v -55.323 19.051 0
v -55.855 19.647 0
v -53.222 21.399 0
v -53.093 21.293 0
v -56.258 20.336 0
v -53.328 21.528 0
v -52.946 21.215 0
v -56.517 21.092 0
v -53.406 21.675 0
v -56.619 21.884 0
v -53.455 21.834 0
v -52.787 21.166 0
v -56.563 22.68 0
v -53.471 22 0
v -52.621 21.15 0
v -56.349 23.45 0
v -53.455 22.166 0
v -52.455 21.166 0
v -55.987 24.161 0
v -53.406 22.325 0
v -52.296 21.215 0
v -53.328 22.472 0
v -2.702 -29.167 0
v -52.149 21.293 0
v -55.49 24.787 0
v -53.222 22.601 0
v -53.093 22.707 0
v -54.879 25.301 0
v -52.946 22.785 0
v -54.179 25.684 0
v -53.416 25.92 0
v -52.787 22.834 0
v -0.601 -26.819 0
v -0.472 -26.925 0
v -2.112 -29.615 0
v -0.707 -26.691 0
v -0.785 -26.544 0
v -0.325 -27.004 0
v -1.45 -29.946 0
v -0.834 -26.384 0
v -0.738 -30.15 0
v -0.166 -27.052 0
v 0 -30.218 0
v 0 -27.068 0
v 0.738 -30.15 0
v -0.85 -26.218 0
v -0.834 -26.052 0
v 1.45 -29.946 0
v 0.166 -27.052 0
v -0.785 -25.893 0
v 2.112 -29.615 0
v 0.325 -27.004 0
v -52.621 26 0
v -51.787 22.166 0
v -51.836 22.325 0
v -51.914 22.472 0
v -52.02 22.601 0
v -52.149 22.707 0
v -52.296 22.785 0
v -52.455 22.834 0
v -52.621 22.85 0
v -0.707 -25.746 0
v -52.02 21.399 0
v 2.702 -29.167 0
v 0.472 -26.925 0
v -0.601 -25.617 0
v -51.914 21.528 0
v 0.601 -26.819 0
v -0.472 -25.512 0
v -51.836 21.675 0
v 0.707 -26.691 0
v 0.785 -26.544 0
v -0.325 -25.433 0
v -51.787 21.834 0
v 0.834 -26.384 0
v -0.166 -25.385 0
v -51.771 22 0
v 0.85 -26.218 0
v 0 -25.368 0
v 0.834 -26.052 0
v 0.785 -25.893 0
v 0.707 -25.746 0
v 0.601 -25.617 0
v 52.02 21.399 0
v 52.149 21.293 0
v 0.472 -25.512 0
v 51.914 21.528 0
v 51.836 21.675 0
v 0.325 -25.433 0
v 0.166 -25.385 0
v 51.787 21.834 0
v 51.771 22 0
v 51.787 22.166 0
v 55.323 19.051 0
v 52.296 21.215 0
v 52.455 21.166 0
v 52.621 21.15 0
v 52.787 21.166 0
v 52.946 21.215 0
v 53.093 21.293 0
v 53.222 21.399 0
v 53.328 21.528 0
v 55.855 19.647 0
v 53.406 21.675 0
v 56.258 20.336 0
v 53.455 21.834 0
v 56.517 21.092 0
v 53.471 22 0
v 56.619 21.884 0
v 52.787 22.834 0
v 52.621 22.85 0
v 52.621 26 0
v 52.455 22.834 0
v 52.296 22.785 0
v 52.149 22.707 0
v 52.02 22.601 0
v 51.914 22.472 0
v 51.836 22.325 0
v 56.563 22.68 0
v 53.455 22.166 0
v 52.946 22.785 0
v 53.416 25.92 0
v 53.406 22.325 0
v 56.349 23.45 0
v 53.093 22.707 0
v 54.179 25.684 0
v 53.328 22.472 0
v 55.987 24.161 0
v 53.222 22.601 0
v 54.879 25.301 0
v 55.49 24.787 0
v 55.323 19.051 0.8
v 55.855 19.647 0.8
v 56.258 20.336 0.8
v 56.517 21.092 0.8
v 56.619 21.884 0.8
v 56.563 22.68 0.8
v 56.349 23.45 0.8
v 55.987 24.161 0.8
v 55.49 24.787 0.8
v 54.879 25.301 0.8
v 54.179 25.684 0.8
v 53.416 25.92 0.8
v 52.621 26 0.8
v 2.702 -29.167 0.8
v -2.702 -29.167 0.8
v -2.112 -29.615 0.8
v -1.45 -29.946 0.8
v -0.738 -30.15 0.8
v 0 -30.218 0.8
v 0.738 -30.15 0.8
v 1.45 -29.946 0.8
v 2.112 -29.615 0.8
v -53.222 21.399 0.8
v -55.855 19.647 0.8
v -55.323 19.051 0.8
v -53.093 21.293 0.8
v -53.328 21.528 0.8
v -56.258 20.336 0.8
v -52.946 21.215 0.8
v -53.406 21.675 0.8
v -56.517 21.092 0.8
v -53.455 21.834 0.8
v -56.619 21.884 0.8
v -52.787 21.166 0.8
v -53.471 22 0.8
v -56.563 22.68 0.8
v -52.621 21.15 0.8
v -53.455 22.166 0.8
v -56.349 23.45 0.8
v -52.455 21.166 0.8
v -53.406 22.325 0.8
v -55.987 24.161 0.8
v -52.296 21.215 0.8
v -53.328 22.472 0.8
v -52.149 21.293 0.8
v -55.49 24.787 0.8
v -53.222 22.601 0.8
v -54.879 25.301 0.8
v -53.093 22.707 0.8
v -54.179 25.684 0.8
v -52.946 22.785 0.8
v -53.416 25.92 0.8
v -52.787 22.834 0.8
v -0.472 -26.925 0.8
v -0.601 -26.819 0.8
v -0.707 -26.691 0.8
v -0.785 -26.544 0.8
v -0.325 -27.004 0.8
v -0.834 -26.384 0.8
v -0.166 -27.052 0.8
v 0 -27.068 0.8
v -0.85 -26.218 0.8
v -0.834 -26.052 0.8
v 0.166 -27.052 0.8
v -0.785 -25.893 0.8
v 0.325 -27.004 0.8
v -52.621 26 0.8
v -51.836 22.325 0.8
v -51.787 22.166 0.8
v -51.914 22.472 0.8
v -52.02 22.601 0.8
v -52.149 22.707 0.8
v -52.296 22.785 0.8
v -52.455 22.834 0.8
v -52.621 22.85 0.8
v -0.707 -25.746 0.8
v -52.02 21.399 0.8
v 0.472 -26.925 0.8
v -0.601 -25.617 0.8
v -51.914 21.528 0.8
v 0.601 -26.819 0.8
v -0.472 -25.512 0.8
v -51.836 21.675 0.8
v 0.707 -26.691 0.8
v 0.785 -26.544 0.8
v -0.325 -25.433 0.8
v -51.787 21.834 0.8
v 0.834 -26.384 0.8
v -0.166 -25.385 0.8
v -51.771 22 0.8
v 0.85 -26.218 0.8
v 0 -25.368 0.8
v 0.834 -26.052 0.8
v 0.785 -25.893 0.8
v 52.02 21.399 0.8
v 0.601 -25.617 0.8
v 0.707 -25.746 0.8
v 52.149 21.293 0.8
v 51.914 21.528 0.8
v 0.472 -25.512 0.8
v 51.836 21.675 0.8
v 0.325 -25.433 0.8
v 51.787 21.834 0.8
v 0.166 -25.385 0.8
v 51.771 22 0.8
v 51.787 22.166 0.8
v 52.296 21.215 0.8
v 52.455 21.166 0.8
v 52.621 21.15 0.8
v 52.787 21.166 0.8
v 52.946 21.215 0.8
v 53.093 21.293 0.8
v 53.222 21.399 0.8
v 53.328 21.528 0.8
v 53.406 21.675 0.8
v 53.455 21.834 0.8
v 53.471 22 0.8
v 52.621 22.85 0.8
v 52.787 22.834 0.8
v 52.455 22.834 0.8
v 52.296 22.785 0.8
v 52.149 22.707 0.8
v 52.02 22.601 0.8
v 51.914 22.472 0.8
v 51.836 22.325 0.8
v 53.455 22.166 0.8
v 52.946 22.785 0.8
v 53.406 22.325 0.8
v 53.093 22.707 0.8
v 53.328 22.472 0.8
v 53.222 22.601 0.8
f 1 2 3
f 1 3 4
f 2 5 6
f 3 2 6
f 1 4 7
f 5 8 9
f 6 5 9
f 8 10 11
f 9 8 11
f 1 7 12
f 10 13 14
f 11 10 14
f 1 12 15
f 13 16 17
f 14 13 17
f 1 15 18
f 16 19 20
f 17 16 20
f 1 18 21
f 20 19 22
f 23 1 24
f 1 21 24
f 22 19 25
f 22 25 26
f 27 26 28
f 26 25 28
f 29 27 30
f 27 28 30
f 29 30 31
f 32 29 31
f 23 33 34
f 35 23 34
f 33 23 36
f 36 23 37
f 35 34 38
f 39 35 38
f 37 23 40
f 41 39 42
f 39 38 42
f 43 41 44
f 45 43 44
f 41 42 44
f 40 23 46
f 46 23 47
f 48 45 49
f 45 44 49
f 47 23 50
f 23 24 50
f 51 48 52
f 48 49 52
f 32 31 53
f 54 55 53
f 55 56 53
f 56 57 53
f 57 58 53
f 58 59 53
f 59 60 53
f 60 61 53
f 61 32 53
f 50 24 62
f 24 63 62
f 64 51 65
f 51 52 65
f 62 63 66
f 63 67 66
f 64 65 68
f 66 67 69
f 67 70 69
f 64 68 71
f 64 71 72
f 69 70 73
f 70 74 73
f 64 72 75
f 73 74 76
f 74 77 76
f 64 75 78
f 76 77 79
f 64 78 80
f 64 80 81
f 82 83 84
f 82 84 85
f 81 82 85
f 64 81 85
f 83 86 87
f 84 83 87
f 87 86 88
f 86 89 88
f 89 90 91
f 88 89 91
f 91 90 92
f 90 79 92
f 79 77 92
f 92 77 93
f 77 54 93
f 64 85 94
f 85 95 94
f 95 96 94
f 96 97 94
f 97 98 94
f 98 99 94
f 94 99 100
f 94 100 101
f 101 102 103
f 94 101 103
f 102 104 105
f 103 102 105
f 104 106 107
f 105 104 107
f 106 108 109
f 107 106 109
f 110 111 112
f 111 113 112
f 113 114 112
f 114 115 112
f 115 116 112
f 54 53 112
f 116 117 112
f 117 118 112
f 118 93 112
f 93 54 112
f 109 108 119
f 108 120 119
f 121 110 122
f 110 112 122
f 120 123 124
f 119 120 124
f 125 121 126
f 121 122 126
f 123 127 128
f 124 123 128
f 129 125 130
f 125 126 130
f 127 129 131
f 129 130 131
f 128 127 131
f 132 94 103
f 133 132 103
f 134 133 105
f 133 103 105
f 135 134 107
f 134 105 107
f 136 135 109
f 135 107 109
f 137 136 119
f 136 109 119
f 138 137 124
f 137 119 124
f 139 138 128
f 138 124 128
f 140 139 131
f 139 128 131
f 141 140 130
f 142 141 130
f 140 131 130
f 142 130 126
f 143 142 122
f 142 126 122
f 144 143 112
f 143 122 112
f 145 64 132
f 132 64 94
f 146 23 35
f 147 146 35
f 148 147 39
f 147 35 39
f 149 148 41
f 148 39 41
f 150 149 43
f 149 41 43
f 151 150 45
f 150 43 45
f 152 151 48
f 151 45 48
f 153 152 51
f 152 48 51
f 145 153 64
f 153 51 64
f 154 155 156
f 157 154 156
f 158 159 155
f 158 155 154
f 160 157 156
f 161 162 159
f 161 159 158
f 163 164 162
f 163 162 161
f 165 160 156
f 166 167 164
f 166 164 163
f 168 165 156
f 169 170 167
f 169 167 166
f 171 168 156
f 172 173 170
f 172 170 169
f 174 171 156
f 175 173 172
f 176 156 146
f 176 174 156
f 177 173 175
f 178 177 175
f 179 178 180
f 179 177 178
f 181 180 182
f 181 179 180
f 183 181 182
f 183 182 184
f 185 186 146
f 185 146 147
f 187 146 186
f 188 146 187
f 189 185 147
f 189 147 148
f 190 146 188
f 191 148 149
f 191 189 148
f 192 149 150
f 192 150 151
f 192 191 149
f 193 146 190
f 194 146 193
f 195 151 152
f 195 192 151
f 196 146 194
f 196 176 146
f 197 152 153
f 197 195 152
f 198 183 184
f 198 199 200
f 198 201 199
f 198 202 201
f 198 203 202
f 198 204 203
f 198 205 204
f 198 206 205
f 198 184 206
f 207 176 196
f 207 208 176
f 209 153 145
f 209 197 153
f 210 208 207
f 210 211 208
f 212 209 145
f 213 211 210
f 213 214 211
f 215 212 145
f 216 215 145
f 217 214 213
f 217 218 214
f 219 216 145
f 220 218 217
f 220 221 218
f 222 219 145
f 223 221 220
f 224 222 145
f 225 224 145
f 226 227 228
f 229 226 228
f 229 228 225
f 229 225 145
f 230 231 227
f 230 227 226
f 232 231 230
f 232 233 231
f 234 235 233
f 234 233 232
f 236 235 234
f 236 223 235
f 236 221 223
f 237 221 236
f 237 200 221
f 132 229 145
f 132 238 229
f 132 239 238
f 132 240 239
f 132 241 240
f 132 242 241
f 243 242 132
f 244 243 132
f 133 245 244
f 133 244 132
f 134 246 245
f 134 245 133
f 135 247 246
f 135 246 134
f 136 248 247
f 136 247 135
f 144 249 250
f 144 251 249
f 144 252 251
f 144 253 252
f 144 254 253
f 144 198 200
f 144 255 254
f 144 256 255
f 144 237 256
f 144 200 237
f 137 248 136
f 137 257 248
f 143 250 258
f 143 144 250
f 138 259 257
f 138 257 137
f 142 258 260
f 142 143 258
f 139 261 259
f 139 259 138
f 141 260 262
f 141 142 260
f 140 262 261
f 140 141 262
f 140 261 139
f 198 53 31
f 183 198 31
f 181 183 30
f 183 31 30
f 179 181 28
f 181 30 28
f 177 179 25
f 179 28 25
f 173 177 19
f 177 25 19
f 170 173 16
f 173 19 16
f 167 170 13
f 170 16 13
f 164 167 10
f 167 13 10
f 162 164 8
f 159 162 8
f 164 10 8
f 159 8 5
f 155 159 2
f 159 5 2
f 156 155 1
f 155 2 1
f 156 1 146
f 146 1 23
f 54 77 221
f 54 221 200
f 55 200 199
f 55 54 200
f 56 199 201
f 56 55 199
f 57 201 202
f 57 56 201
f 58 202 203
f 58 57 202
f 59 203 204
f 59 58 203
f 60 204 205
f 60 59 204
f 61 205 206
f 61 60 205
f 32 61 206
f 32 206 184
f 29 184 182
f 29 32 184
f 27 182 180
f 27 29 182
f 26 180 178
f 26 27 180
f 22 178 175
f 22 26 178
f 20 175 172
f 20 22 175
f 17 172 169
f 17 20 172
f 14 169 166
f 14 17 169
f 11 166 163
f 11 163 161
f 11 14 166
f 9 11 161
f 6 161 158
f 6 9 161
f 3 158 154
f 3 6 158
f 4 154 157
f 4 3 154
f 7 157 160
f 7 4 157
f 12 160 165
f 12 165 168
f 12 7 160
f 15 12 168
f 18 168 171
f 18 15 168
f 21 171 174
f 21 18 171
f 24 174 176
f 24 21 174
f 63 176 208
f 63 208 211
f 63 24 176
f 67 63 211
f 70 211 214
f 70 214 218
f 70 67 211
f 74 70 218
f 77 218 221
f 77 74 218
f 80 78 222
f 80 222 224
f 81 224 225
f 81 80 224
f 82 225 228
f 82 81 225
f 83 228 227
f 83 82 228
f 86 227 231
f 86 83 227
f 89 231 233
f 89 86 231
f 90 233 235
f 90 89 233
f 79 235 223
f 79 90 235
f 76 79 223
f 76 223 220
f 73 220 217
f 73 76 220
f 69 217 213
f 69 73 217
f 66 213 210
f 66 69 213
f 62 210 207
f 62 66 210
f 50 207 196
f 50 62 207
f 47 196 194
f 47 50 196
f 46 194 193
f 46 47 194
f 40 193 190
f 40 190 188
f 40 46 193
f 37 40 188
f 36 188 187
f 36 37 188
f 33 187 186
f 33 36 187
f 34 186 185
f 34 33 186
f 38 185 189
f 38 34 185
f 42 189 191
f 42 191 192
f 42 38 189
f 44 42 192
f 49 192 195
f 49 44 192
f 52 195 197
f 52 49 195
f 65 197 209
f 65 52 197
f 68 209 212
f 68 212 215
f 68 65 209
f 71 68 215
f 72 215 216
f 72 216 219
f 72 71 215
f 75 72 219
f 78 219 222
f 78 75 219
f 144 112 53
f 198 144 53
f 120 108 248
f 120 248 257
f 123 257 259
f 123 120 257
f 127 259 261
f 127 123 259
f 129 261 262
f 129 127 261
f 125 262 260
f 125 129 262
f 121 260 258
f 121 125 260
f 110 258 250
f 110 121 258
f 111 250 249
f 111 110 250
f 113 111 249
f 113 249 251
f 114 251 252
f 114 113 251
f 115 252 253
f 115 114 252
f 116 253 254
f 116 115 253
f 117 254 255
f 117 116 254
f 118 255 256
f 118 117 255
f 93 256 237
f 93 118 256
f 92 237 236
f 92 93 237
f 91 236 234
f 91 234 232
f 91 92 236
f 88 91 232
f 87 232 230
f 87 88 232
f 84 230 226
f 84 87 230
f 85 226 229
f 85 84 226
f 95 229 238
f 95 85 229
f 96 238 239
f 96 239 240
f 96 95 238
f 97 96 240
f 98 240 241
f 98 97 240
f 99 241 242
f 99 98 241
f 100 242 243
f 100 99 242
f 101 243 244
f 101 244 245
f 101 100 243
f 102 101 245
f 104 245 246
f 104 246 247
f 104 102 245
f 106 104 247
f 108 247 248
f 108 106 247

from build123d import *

# Parameters (mm, degrees)
SKETCH_1_R      = 0.85
EXTRUDE_1_DEPTH = 0.8


with BuildPart() as part:
    # 草图1 → 凸台-拉伸1 (new body)
    with BuildSketch(Plane.XY):
        with BuildLine():
            Line((52.621031394, 26), (-52.621031394, 26))
            ThreePointArc((-52.621031394, 26), (-56.349062871, 23.449752153), (-55.323392225, 19.050890653))
            Line((-55.323392225, 19.050890653), (-2.70236083, -29.167400823))
            ThreePointArc((-2.70236083, -29.167400823), (0, -30.218291475), (2.70236083, -29.167400823))
            Line((2.70236083, -29.167400823), (55.323392225, 19.050890653))
            ThreePointArc((55.323392225, 19.050890653), (56.349062871, 23.449752153), (52.621031394, 26))
        make_face()
        with Locations((-52.621031394, 22)):
            Circle(SKETCH_1_R, mode=Mode.SUBTRACT)
        with Locations((52.621031394, 22)):
            Circle(SKETCH_1_R, mode=Mode.SUBTRACT)
        with Locations((0, -26.218291475)):
            Circle(SKETCH_1_R, mode=Mode.SUBTRACT)
    extrude(amount=EXTRUDE_1_DEPTH)


solid = part.part
